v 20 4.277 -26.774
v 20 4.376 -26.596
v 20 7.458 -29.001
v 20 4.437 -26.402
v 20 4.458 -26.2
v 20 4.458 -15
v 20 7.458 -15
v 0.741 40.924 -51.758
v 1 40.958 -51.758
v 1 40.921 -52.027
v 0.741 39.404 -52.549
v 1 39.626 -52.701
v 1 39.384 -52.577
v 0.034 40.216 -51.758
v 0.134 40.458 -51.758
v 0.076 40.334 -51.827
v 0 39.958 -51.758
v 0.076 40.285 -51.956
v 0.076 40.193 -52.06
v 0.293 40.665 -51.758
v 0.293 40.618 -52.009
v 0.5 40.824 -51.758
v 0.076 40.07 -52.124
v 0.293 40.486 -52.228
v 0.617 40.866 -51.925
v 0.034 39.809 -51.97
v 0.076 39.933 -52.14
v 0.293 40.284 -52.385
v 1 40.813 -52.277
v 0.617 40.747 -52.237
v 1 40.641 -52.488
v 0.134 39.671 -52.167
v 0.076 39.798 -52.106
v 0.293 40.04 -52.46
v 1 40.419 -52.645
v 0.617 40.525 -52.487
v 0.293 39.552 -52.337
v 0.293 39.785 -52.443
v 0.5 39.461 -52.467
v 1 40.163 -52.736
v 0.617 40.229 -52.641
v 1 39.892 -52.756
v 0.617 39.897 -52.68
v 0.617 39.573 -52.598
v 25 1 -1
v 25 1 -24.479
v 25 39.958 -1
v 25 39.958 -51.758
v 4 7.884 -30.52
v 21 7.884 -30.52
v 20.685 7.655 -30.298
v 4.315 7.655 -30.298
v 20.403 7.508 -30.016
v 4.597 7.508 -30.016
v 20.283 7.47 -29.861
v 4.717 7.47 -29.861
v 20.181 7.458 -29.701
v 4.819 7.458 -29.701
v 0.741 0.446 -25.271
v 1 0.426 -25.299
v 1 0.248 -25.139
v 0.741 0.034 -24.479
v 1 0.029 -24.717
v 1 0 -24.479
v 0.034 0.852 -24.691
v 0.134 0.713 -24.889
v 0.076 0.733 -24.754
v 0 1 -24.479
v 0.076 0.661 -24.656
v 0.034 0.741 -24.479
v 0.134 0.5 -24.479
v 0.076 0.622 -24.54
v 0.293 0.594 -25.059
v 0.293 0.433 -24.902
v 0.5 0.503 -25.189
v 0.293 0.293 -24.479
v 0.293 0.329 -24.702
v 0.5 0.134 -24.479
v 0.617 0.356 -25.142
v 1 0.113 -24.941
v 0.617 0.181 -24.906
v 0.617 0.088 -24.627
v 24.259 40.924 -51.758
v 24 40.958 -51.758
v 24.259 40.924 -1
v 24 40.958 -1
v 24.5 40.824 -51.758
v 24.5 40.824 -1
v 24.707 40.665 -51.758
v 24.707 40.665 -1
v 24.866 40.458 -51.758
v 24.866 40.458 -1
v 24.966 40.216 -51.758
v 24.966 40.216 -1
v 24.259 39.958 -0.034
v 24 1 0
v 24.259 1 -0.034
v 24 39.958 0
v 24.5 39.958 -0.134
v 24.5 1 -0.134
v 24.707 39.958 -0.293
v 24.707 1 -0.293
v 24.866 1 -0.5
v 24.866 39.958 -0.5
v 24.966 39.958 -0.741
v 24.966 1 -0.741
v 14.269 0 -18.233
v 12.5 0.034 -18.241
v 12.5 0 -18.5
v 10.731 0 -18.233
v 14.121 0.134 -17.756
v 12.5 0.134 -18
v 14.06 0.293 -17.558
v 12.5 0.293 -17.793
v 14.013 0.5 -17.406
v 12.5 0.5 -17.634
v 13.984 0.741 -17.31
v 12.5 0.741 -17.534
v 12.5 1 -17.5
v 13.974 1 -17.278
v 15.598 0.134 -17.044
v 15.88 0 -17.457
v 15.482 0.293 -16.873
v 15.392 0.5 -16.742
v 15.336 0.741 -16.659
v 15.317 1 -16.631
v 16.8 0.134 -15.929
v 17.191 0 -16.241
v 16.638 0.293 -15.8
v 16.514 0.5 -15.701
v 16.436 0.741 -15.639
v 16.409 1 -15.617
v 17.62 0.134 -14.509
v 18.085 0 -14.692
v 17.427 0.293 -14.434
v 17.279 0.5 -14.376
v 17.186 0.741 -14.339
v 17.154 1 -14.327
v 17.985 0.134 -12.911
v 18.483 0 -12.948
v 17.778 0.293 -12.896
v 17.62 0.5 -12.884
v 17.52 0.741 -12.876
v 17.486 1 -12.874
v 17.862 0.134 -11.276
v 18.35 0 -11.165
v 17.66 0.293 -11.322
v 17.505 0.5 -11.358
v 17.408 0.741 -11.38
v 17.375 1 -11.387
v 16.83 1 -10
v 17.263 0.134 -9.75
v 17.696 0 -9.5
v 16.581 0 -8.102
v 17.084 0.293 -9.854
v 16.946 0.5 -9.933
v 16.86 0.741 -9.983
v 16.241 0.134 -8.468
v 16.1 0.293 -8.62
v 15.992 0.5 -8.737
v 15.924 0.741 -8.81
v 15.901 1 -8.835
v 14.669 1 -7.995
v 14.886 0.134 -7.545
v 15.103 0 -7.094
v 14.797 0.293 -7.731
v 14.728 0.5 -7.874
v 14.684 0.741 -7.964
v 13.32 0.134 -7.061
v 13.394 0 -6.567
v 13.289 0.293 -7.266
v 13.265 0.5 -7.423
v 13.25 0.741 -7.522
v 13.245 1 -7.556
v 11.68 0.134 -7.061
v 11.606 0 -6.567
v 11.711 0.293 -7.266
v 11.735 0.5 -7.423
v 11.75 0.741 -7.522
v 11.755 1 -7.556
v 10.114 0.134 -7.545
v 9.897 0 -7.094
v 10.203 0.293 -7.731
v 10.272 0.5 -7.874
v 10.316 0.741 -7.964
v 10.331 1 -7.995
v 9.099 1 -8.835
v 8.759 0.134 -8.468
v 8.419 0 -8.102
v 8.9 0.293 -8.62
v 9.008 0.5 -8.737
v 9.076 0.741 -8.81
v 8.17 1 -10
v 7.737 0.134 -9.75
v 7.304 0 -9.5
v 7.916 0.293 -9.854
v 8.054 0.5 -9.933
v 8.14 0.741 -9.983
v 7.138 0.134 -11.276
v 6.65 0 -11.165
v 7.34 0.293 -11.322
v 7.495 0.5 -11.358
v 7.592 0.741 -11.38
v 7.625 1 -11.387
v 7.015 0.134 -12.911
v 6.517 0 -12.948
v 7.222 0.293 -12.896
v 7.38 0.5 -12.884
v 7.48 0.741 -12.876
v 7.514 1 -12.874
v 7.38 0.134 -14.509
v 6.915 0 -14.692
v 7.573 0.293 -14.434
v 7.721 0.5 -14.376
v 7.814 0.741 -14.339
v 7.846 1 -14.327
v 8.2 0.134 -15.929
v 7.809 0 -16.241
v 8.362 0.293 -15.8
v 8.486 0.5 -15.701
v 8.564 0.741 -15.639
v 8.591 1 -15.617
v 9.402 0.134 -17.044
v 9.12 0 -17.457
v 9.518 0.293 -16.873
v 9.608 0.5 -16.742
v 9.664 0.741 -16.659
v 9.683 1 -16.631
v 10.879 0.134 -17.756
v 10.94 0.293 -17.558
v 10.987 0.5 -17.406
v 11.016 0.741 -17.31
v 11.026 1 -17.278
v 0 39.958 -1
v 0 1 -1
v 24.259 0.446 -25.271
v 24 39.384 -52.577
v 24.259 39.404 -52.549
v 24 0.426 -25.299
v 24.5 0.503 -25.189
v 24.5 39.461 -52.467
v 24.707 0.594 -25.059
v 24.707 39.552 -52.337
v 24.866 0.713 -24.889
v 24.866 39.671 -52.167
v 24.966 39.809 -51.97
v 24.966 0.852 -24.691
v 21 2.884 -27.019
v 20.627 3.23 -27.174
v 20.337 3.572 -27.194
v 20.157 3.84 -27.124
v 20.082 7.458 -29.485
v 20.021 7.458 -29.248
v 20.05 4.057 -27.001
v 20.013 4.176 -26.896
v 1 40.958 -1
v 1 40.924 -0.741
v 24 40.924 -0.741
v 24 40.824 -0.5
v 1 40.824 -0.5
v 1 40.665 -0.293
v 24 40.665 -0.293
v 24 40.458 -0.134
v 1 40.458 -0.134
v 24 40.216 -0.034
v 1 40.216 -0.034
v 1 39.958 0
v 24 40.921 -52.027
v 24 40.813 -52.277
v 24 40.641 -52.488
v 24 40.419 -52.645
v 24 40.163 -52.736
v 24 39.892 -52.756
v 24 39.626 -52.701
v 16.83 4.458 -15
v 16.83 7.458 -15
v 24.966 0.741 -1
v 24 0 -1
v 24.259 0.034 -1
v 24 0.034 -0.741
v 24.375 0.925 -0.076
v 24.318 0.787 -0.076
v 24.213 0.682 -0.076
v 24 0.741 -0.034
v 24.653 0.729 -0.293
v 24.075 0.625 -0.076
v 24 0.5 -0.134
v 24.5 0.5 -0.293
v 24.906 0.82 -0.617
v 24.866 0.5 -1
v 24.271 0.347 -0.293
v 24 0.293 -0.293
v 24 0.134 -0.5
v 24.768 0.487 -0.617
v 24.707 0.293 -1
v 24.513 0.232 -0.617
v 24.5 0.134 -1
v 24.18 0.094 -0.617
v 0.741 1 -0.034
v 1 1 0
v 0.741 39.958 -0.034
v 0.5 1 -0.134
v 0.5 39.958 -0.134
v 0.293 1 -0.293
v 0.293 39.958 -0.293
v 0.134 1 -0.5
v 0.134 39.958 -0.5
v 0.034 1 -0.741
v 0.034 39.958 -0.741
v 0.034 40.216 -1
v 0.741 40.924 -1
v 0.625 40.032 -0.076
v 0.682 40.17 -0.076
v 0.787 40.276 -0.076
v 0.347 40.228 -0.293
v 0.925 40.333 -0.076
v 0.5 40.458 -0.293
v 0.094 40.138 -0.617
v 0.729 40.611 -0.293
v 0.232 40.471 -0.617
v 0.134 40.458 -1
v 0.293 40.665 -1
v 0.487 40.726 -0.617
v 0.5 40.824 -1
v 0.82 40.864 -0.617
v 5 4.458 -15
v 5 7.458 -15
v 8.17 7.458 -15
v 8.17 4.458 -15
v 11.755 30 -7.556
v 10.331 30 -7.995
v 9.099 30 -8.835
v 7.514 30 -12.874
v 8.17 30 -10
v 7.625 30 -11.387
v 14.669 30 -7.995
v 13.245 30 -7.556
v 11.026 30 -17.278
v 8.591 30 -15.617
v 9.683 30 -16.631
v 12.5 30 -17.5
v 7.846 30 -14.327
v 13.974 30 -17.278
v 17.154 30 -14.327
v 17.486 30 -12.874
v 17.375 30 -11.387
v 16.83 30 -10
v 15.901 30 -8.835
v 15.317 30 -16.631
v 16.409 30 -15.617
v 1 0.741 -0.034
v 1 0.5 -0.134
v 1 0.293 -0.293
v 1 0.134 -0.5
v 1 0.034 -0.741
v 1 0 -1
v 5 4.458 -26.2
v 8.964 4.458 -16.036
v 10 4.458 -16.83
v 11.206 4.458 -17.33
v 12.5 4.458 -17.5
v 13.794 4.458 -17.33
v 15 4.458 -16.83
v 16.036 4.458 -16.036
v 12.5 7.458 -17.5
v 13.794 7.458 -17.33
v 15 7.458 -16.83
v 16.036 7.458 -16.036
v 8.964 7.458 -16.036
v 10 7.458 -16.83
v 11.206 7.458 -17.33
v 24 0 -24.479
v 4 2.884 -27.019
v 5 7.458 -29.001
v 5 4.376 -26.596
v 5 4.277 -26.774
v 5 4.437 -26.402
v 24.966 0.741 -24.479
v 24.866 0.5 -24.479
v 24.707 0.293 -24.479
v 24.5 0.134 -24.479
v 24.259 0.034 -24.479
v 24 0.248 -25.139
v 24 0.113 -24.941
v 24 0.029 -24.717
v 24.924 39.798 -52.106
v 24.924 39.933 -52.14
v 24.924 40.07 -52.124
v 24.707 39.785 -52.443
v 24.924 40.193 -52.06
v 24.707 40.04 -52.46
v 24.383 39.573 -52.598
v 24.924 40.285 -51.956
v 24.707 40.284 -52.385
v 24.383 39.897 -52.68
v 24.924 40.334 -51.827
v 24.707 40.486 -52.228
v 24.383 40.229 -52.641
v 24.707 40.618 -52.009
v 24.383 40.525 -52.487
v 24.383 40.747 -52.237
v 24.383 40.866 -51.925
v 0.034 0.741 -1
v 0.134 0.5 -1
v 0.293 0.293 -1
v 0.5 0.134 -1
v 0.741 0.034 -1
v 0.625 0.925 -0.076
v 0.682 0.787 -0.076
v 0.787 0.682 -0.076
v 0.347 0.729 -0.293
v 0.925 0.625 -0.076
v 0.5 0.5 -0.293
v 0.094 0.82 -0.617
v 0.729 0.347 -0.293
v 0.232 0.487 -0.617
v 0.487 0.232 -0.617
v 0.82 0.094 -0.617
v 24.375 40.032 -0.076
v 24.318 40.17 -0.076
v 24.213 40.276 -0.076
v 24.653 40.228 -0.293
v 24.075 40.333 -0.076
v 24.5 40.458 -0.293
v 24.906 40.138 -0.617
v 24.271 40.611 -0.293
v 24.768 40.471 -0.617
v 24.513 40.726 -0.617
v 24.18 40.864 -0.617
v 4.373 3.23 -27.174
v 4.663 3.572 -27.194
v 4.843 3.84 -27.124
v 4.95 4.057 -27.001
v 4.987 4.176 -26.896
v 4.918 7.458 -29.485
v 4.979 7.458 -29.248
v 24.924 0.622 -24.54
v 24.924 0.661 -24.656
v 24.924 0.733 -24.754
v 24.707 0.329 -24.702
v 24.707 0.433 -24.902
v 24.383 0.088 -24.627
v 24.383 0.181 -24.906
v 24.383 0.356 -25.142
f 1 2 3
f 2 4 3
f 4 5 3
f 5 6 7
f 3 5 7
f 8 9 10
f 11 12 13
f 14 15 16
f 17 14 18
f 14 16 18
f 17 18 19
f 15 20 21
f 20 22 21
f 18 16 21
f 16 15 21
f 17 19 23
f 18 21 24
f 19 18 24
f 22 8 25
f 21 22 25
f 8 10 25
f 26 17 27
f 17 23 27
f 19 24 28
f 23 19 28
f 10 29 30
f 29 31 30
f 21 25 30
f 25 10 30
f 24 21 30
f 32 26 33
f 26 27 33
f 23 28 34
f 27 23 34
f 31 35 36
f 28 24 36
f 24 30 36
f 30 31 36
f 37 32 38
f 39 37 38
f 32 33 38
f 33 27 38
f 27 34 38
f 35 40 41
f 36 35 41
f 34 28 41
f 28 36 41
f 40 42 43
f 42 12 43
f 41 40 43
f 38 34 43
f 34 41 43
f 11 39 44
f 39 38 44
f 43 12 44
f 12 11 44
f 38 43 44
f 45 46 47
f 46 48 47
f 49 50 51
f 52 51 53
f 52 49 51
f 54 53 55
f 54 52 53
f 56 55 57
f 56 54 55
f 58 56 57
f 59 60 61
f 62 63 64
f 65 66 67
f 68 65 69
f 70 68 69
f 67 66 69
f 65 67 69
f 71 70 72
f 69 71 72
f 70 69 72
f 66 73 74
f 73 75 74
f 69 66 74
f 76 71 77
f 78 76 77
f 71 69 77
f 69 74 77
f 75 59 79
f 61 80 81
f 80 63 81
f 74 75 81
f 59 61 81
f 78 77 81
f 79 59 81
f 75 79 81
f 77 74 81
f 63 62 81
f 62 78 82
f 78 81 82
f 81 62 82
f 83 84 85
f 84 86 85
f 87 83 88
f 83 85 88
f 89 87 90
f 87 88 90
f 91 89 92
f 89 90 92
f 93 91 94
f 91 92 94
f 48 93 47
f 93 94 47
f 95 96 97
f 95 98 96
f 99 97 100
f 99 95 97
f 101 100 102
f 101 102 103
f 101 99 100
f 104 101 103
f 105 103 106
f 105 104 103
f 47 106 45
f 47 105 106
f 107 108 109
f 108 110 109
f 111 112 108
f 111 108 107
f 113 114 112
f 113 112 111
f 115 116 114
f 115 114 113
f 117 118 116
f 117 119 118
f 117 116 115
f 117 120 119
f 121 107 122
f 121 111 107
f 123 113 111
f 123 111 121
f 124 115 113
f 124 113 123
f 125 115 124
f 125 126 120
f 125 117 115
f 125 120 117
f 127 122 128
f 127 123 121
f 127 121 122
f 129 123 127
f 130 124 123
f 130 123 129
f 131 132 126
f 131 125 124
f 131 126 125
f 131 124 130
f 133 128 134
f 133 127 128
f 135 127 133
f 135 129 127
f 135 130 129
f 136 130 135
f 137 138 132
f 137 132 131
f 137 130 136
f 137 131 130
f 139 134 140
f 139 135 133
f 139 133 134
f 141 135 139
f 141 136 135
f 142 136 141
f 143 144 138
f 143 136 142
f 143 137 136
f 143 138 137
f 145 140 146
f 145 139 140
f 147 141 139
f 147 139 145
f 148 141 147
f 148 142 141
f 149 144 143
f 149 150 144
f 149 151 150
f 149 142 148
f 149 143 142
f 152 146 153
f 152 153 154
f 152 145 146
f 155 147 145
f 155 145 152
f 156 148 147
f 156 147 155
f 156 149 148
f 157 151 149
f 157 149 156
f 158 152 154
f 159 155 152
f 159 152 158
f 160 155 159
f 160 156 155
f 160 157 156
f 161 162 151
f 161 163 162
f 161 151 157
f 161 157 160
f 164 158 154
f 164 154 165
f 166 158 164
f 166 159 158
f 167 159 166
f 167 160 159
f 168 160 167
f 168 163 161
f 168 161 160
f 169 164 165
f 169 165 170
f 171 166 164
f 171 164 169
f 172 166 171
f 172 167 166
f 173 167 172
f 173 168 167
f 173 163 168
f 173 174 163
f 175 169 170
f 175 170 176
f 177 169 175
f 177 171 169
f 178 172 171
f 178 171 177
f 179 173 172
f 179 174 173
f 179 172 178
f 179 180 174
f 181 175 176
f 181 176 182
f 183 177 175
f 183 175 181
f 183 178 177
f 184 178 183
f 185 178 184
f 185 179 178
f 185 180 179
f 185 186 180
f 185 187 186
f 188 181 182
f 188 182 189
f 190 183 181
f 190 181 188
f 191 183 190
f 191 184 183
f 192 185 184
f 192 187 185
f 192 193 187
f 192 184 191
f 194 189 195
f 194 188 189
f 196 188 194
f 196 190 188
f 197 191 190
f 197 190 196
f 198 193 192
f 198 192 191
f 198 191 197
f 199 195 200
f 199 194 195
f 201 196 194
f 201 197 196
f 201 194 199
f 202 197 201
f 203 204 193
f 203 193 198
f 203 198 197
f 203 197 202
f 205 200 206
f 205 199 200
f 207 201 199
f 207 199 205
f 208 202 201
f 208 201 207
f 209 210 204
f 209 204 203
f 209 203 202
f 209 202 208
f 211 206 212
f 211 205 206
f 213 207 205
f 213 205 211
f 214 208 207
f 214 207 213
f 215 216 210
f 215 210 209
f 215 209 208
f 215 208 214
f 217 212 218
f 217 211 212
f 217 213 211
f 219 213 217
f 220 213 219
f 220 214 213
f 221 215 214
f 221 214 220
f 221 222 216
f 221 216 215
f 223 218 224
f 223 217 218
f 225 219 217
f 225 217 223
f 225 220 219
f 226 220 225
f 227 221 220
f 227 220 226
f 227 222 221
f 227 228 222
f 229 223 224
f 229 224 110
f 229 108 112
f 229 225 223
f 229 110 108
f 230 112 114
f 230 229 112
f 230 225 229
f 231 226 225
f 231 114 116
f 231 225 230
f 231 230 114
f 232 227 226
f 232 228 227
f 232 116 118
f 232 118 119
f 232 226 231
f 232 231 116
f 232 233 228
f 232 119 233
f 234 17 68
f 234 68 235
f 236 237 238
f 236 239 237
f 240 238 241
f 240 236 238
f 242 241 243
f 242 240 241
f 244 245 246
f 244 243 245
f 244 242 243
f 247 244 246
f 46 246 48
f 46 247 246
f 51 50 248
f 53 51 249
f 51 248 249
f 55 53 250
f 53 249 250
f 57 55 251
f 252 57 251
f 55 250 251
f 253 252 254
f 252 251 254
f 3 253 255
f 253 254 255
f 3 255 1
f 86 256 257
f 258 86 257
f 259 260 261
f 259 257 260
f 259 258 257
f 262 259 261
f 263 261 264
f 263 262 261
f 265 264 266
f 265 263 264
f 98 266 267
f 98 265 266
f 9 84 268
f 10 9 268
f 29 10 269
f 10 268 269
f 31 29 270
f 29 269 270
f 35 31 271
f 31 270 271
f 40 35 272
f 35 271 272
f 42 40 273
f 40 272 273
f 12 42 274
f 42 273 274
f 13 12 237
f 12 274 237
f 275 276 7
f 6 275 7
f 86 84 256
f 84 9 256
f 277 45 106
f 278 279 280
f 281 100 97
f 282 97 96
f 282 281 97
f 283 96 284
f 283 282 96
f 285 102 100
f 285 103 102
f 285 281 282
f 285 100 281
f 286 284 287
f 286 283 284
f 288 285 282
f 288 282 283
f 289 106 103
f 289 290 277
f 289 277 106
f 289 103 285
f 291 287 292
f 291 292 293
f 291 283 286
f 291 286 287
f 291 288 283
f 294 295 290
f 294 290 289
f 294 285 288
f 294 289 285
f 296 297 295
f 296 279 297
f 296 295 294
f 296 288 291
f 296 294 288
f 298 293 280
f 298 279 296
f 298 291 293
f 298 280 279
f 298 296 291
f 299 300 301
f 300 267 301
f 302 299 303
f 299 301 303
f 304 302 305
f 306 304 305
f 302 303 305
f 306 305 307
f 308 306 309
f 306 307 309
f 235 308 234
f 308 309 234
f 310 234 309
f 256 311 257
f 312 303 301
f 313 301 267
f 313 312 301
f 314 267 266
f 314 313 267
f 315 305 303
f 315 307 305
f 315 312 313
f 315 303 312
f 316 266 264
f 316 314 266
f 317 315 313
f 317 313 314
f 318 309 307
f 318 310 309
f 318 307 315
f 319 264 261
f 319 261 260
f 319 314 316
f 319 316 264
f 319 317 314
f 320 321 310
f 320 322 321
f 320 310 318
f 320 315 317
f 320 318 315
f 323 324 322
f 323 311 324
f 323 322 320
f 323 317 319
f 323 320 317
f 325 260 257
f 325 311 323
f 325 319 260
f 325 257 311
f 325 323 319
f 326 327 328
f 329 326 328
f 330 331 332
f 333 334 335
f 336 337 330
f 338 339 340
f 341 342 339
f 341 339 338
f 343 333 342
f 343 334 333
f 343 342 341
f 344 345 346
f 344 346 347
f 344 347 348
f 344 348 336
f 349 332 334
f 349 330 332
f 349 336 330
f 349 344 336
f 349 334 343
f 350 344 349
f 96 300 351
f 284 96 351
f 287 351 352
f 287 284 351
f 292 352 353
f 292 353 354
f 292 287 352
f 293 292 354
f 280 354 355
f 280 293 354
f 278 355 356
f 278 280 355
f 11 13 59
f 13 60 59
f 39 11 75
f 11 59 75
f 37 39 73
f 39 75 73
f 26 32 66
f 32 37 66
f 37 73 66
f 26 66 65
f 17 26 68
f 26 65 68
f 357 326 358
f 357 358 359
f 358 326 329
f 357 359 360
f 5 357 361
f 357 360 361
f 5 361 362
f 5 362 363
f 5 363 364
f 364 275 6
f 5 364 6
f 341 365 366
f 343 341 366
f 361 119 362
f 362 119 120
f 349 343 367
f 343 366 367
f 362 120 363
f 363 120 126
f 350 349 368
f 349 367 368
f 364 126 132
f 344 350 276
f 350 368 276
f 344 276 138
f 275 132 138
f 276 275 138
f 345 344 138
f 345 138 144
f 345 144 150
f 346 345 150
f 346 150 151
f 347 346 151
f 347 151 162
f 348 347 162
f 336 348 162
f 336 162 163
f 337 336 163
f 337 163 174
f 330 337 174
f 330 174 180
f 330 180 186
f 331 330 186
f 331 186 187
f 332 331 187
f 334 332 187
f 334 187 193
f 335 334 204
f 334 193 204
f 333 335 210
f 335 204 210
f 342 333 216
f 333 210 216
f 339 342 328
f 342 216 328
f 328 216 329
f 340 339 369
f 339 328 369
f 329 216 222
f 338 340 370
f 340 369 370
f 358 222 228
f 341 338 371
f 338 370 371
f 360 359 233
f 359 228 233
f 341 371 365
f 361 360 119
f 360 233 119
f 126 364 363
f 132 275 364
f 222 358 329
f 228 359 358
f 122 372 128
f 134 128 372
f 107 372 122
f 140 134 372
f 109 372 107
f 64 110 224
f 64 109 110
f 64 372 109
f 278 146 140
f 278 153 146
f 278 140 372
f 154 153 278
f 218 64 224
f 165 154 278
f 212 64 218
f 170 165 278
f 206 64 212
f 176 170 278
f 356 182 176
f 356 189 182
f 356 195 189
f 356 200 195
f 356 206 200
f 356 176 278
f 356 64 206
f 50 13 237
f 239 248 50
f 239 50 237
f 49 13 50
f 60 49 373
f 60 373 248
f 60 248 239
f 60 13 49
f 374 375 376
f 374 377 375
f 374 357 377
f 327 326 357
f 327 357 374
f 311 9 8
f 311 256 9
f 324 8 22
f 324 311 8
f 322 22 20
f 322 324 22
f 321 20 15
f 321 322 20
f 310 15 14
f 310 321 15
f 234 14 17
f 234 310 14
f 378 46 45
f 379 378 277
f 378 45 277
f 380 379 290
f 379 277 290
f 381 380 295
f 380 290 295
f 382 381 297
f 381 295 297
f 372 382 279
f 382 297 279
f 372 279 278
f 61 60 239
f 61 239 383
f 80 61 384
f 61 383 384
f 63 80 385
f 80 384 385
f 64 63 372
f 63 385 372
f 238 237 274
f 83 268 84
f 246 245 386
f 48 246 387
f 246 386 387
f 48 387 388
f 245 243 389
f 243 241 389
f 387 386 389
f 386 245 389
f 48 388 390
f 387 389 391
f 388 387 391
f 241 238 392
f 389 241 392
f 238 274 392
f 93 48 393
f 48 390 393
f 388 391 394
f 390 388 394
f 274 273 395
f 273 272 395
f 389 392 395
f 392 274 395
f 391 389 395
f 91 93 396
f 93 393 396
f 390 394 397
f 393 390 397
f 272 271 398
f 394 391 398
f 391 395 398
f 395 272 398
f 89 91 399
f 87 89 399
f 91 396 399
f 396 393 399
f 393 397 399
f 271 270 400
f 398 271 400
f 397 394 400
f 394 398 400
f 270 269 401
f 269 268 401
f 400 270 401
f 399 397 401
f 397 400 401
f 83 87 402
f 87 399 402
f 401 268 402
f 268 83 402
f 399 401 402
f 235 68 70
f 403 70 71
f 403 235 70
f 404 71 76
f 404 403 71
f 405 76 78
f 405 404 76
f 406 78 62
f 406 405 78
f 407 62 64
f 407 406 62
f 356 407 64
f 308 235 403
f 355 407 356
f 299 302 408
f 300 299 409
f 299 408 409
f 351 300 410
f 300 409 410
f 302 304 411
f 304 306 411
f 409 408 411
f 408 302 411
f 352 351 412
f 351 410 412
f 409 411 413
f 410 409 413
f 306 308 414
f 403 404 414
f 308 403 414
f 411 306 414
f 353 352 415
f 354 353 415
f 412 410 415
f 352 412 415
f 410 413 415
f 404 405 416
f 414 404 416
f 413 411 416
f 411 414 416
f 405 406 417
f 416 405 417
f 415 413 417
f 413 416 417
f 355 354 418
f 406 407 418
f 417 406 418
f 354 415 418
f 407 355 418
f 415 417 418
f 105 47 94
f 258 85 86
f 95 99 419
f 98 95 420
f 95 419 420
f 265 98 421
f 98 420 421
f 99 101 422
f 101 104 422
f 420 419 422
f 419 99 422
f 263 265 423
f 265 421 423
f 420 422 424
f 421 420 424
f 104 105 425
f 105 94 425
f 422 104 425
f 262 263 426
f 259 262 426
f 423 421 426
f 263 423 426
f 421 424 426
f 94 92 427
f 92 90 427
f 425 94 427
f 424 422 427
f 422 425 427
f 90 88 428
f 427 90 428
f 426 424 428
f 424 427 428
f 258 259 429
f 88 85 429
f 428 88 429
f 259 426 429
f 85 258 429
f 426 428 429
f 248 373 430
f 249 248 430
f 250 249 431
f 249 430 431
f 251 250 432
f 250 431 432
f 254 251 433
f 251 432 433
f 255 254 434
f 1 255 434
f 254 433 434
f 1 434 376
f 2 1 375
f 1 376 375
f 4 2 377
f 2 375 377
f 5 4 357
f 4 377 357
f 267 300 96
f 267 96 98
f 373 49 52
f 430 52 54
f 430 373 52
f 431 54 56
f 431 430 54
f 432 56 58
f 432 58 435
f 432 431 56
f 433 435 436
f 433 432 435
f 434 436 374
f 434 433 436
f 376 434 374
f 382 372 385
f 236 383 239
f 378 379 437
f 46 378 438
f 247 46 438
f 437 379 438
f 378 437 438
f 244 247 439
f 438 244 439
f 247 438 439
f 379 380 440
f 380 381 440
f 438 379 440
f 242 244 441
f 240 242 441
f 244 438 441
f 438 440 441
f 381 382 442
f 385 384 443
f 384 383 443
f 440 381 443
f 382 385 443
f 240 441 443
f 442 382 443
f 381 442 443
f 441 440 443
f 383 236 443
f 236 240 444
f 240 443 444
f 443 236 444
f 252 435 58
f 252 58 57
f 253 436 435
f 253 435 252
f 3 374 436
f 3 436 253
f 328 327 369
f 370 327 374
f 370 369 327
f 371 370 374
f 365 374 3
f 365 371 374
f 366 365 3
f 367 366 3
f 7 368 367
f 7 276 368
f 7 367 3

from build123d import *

# Parameters (mm, degrees)
BOSS_EXTRUDE1_DEPTH = 25
SKETCH3_R           = 5
CUT_EXTRUDE1_DEPTH  = 30
SKETCH8_W           = 15
SKETCH8_H           = 3
CUT_EXTRUDE10_DEPTH = 30
FILLET1_R           = 1
FILLET2_R           = 1


with BuildPart() as part:
    # Sketch2 → Boss-Extrude1 (new body)
    with BuildSketch(Plane(origin=(0, 0, 0), x_dir=(0, 0, -1), z_dir=(1, 0, 0))):
        Polygon((25, 40.957602214), (53.678821818, 40.957602214), (25, 0), (0, 0), (0, 40.957602214), align=None)
    extrude(amount=BOSS_EXTRUDE1_DEPTH)

    # Sketch3 → Cut-Extrude1 (cut)
    with BuildSketch(Plane.XZ):
        with Locations(Location((12.5, -12.5, 0), (0, 0, 270))):
            Circle(SKETCH3_R)
    extrude(amount=-CUT_EXTRUDE1_DEPTH, mode=Mode.SUBTRACT)

    # Sketch8 → Cut-Extrude10 (cut)
    with BuildSketch(Plane.XY.offset(-15)):
        with Locations((12.5, 5.957602214)):
            Rectangle(SKETCH8_W, SKETCH8_H)
    extrude(amount=-CUT_EXTRUDE10_DEPTH, mode=Mode.SUBTRACT)

    # Fillet1
    fillet1_edges = [part.edges().sort_by_distance(p)[0] for p in [
        (25, 0, -12.5),
        (25, 20.478801107, -39.339410909),
        (5, 5.957602214, -29.17155798),
        (20, 5.957602214, -29.17155798),
        (12.5, 4.457602214, -28.121246673),
        (12.5, 7.457602214, -30.221869288),
        (25, 40.957602214, -26.839410909),
        (0, 40.957602214, -26.839410909),
        (0, 20.478801107, -39.339410909),
        (0, 0, -12.5),
        (0, 20.478801107, 0),
        (25, 20.478801107, 0),
        (12.5, 40.957602214, -53.678821818),
        (12.5, 0, -25),
        (12.5, 0, 0),
        (12.5, 40.957602214, 0),
    ]]
    fillet(fillet1_edges, radius=FILLET1_R)

    # Fillet2
    fillet2_edges = [part.edges().sort_by_distance(p)[0] for p in [
        (12.5, 0, -7.5),
    ]]
    fillet(fillet2_edges, radius=FILLET2_R)


solid = part.part
